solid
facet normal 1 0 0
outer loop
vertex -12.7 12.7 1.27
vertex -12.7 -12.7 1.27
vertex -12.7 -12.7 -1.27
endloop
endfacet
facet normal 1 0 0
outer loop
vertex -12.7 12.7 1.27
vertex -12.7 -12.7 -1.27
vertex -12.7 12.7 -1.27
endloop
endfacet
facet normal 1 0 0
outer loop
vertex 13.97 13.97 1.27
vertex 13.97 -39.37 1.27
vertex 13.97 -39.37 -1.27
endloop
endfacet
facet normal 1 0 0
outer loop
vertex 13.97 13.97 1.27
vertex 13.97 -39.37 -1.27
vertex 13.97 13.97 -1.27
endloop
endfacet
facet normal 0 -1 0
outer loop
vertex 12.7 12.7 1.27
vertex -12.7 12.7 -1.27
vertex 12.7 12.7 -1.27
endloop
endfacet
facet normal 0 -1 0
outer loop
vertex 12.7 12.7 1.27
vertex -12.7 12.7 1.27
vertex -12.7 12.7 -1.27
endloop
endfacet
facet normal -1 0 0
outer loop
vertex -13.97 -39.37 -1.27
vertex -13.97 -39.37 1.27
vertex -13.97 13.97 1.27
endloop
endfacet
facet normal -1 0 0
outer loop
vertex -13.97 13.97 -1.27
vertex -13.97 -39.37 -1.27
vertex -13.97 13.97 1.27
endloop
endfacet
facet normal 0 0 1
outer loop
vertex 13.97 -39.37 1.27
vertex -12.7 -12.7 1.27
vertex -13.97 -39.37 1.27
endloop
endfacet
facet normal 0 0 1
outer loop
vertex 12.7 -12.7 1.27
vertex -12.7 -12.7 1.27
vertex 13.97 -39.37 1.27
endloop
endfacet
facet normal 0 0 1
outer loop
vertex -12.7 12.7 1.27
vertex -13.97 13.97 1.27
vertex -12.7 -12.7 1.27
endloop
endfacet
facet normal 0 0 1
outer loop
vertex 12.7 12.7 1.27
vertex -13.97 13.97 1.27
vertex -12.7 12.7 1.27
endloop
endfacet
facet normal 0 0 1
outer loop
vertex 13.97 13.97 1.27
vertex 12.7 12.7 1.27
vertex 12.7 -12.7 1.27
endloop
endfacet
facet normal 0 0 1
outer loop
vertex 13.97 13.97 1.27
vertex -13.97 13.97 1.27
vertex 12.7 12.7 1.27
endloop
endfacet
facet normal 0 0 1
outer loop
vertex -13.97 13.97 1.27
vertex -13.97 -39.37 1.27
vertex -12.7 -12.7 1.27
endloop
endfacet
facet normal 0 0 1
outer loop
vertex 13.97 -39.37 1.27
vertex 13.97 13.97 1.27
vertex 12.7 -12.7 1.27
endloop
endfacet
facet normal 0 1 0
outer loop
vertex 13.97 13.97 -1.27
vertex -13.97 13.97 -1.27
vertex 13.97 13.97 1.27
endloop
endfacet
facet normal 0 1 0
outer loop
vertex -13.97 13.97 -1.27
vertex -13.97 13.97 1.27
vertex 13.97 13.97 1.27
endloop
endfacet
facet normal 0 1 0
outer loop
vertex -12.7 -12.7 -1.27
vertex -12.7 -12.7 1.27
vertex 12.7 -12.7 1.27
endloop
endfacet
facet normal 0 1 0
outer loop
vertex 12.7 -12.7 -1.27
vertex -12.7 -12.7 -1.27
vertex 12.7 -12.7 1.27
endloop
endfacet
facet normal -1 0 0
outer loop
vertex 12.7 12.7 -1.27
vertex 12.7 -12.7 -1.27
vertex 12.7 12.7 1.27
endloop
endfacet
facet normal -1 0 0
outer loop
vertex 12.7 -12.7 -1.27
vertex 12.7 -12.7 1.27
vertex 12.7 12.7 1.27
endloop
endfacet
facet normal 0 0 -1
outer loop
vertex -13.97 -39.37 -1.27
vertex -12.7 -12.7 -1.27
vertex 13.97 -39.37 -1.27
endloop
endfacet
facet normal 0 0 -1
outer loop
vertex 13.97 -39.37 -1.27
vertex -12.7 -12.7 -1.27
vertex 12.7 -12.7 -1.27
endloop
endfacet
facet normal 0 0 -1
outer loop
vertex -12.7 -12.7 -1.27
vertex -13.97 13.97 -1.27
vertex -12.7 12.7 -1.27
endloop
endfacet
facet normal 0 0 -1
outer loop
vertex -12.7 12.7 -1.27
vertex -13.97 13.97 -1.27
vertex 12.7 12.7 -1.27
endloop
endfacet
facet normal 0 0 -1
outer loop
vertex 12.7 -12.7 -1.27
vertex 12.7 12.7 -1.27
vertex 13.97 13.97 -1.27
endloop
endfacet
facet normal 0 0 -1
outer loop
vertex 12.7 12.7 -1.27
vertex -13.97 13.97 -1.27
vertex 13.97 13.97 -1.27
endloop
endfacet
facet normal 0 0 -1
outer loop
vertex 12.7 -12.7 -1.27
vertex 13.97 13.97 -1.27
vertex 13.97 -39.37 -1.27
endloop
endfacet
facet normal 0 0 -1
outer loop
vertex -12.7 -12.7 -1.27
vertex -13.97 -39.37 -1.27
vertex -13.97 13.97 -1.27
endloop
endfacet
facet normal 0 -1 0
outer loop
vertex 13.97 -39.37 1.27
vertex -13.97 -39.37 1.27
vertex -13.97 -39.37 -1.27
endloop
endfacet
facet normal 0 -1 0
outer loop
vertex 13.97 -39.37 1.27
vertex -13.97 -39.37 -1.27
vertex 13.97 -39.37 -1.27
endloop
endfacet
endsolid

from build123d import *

# Parameters (mm, degrees)
SKETCH1_W           = 27.94
SKETCH1_H           = 27.94
SKETCH1_W_2         = 25.4
SKETCH1_H_2         = 25.4
EXTRUDE_THIN1_DEPTH = 1.27
SKETCH2_W           = 27.94
SKETCH2_H           = 25.4
BOSS_EXTRUDE1_DEPTH = 2.54


with BuildPart() as part:
    # Sketch1 → Extrude-Thin1 (new body, symmetric)
    with BuildSketch(Plane.XY):
        Rectangle(SKETCH1_W, SKETCH1_H)
        Rectangle(SKETCH1_W_2, SKETCH1_H_2, mode=Mode.SUBTRACT)
    extrude(amount=EXTRUDE_THIN1_DEPTH, both=True)

    # Sketch2 → Boss-Extrude1 (add, through all)
    with BuildSketch(Plane.XY.offset(1.27)):
        with Locations((0, -26.67)):
            Rectangle(SKETCH2_W, SKETCH2_H)
    extrude(amount=-BOSS_EXTRUDE1_DEPTH)


solid = part.part
